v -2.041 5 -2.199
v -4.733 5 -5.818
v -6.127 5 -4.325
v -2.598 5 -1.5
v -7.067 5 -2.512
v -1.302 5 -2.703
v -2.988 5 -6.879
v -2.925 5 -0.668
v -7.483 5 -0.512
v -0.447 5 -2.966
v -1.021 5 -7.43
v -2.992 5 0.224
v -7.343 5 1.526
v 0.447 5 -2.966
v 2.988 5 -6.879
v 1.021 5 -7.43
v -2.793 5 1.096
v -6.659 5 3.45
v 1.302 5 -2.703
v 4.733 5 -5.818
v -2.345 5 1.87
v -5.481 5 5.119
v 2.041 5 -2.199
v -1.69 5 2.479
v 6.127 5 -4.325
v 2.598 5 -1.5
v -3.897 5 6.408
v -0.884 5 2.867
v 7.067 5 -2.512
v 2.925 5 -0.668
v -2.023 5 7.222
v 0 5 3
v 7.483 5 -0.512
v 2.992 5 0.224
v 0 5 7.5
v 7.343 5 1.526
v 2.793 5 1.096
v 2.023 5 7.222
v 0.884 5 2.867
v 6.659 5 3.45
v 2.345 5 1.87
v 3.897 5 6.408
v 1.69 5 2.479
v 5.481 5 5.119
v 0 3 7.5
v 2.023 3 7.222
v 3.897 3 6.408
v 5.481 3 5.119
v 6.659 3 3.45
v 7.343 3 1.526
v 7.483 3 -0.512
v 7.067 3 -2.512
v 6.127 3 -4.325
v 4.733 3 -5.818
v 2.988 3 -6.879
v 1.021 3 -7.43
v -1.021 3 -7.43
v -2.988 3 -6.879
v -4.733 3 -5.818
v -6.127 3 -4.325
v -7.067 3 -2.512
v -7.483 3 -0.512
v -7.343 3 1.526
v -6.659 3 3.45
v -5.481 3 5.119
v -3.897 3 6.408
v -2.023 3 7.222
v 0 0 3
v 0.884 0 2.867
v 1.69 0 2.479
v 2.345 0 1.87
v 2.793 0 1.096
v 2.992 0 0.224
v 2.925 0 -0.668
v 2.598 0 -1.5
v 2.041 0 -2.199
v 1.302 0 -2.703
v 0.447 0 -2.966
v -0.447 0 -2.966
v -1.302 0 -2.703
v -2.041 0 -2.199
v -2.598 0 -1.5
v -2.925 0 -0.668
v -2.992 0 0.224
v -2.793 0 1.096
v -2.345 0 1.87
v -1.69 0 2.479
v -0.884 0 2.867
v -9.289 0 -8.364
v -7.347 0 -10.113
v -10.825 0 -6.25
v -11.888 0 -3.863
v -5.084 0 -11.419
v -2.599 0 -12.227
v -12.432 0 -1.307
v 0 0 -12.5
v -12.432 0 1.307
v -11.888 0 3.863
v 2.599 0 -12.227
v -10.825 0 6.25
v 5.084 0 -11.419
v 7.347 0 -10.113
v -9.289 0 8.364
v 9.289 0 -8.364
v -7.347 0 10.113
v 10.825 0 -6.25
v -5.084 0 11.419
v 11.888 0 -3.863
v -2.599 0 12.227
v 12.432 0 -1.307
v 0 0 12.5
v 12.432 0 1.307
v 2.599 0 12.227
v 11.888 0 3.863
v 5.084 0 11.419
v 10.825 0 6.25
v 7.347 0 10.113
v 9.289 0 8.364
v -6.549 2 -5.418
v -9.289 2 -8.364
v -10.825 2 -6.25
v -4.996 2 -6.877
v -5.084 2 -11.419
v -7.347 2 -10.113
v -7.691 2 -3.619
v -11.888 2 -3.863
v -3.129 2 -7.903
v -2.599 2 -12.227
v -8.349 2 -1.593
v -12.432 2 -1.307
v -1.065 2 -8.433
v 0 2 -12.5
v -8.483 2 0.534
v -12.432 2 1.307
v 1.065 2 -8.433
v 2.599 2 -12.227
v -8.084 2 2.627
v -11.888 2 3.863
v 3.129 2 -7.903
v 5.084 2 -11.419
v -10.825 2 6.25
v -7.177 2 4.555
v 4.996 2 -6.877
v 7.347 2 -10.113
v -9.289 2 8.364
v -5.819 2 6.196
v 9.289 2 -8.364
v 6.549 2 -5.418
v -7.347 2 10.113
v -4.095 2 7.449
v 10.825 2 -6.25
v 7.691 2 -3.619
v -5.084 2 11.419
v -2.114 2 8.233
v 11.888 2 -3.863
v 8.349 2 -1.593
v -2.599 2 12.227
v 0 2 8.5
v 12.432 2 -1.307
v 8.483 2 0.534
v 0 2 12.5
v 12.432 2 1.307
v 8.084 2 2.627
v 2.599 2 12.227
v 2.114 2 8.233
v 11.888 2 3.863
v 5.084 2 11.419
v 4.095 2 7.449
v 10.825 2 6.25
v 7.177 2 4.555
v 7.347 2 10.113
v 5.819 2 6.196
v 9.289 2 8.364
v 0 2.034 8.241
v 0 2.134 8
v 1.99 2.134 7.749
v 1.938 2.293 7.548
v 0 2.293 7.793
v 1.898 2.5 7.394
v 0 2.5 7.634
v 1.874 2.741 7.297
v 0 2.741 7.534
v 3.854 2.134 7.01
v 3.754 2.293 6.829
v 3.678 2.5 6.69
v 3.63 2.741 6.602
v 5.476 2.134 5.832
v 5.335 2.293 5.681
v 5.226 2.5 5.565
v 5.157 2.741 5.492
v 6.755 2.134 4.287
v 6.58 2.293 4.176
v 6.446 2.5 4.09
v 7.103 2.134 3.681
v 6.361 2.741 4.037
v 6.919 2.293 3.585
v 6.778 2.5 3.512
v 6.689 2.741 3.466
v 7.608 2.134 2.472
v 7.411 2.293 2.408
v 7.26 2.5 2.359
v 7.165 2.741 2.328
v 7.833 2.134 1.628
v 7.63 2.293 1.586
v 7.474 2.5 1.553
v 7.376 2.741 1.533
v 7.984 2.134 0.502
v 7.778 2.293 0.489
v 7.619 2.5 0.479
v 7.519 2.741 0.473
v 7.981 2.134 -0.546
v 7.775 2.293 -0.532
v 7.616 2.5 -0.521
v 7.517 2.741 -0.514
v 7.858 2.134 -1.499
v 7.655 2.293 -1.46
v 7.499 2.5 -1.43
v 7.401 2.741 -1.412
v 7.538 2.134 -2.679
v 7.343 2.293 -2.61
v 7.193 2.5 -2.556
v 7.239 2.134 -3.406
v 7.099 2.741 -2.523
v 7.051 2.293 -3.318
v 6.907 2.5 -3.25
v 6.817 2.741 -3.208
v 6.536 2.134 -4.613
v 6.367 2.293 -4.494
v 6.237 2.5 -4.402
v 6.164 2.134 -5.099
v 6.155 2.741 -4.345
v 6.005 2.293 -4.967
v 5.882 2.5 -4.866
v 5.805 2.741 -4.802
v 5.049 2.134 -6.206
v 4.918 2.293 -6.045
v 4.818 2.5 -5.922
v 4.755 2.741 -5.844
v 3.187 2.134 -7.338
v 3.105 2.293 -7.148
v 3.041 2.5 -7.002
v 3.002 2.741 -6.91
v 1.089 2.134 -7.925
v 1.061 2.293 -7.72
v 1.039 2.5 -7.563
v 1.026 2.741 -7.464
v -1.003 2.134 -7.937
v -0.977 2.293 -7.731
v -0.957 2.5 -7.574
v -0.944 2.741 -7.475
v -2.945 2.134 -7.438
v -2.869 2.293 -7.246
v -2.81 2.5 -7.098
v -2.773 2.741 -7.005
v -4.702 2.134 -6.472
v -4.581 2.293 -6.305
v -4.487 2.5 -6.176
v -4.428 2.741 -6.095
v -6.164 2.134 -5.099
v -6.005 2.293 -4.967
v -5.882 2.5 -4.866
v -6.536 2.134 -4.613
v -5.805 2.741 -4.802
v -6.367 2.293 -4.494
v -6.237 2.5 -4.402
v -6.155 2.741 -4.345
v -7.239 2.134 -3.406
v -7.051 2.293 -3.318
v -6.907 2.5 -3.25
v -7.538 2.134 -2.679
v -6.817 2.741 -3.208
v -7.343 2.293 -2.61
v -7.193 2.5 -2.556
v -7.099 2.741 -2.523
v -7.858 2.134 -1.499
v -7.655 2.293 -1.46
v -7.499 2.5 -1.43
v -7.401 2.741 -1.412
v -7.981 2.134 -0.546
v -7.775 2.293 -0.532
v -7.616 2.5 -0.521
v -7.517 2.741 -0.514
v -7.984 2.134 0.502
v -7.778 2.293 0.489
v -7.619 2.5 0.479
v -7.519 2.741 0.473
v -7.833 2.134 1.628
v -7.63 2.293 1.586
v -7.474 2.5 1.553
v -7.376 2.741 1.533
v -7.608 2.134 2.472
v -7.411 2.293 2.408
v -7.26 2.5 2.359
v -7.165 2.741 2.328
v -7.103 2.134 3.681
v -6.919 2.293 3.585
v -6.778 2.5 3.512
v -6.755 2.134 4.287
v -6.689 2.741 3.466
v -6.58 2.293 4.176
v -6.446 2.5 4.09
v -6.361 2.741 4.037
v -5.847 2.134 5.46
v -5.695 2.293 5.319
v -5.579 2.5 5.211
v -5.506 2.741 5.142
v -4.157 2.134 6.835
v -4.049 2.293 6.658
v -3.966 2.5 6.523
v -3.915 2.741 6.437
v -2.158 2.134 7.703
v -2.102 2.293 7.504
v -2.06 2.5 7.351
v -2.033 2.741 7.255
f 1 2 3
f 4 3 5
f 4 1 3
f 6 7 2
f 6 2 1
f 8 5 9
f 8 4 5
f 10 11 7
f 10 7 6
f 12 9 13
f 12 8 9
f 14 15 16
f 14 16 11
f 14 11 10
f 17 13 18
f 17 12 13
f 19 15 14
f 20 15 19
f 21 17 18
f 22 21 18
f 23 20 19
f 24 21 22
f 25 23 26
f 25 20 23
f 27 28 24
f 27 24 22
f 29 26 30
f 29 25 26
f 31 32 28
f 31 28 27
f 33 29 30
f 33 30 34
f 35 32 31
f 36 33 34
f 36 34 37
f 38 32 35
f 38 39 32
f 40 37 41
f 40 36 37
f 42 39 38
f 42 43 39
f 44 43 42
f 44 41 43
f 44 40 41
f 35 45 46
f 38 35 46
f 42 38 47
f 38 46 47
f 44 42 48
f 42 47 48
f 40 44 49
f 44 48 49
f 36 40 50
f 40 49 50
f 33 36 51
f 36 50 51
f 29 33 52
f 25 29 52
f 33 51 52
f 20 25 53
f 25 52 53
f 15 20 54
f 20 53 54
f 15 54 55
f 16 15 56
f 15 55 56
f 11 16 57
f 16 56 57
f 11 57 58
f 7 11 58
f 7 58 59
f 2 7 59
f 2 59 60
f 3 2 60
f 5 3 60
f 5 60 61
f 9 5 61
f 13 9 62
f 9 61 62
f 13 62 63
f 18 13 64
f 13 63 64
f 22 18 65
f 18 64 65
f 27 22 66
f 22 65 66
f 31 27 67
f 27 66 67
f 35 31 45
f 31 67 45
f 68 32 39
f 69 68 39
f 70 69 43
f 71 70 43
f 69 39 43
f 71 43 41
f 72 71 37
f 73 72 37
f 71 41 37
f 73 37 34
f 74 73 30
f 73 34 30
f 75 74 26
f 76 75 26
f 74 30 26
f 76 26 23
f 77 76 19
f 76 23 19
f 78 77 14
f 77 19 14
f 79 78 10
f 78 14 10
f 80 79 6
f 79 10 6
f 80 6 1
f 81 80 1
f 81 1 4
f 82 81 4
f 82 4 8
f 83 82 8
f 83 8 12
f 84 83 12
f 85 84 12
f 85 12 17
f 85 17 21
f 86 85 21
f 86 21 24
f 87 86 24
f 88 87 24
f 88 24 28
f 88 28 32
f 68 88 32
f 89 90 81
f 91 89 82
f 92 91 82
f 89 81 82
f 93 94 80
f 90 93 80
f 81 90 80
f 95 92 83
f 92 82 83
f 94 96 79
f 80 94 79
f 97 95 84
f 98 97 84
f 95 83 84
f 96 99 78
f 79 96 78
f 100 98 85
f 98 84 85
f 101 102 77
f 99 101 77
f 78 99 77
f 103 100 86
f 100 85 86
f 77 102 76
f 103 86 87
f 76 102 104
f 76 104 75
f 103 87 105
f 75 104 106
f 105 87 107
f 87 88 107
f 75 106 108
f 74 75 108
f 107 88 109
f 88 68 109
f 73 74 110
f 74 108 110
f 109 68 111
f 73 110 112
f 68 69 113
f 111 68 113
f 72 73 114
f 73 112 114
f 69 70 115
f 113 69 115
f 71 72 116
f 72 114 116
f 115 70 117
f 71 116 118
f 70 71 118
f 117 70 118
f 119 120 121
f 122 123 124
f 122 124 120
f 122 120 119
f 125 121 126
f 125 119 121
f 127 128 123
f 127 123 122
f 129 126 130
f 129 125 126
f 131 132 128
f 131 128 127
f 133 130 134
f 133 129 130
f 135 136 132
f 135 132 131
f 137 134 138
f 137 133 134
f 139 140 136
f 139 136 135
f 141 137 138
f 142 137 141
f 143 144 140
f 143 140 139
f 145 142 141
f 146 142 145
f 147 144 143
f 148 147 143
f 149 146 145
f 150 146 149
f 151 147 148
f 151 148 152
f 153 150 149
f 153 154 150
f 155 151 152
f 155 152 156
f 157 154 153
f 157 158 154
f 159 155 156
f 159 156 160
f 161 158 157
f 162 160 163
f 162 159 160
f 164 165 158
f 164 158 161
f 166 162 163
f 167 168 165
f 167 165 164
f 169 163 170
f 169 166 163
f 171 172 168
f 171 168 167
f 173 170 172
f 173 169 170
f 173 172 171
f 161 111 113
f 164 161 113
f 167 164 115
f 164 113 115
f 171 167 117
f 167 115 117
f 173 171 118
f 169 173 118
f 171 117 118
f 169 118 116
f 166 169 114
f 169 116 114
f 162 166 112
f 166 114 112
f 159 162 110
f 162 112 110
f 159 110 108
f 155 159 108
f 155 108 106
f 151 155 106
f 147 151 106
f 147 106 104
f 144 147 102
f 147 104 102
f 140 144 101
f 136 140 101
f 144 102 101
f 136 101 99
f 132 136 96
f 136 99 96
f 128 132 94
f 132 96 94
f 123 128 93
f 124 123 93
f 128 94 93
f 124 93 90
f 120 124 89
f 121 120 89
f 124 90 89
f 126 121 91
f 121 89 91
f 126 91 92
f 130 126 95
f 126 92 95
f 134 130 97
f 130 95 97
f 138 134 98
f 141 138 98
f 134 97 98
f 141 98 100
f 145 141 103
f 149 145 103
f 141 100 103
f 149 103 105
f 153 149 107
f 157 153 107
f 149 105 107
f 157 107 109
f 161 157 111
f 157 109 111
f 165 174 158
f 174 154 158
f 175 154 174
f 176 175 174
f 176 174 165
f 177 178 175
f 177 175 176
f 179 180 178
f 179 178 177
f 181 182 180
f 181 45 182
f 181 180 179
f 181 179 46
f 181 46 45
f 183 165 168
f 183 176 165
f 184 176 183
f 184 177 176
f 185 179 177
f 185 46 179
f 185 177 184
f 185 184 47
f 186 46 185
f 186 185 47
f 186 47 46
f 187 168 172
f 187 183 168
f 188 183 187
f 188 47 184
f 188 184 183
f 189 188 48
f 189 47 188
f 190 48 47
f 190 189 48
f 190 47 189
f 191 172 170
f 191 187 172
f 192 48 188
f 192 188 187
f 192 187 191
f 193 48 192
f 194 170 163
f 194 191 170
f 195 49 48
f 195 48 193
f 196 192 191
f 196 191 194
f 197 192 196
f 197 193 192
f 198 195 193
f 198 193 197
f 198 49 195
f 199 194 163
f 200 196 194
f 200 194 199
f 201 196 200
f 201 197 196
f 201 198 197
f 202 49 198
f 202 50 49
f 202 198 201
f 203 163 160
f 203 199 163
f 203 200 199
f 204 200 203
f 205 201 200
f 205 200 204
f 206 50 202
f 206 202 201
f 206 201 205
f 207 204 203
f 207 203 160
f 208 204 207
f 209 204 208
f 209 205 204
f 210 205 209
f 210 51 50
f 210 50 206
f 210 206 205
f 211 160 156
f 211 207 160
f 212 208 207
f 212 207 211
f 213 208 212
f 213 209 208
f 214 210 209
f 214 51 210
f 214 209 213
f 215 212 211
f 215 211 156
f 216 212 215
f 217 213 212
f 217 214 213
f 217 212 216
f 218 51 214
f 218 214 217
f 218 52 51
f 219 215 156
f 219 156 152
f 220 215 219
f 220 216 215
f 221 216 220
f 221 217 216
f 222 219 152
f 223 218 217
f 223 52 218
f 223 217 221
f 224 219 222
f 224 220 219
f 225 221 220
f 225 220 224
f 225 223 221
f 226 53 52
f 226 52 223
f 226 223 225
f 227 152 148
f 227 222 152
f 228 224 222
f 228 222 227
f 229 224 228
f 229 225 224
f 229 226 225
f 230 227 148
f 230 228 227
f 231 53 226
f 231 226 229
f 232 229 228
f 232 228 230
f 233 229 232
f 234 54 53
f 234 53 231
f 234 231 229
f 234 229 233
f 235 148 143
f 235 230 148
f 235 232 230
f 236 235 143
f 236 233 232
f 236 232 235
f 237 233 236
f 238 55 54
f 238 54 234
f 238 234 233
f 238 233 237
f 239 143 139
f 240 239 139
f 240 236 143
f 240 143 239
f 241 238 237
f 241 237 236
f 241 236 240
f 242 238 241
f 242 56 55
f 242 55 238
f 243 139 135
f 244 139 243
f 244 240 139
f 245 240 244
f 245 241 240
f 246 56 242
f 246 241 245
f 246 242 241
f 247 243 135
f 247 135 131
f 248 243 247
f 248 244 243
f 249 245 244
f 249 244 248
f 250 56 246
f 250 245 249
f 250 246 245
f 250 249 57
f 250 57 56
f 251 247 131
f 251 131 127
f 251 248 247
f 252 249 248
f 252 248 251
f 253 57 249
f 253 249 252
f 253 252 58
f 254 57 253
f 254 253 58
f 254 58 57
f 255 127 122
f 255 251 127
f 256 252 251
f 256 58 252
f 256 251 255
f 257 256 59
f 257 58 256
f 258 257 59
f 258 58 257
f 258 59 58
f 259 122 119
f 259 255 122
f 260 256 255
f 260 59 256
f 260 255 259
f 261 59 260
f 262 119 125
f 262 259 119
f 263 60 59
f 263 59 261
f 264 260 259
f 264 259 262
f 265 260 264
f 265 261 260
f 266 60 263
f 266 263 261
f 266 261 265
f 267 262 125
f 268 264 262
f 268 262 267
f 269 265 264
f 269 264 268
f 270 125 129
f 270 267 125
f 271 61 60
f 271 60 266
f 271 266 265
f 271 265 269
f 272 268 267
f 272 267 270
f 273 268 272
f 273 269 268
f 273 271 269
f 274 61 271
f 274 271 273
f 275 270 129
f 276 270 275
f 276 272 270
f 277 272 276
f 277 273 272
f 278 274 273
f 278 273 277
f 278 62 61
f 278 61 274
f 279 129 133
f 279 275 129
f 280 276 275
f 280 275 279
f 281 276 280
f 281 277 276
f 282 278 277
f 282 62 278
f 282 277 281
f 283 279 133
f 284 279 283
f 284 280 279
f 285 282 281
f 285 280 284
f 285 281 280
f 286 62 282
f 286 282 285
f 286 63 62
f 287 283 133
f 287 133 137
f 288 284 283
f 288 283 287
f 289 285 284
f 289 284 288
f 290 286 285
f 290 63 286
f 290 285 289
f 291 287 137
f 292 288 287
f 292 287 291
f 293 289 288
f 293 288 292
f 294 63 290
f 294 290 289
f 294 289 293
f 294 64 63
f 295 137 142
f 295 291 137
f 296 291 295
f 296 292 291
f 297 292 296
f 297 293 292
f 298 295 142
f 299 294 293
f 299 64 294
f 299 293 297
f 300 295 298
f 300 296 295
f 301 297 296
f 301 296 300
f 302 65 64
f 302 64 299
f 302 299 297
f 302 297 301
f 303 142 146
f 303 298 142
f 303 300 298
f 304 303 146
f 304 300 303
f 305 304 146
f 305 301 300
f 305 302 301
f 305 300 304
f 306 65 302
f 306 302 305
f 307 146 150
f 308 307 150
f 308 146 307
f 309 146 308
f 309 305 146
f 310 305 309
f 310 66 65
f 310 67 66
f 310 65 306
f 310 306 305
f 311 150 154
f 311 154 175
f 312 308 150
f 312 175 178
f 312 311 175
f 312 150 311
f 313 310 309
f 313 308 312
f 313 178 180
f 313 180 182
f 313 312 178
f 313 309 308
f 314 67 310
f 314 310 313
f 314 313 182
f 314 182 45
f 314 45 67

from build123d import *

# Parameters (mm, degrees)
SKETCH_1_R          = 12.5
EXTRUDE_1_DEPTH     = 2
SKETCH_2_R          = 7.5
EXTRUDE_2_DEPTH     = 3
FILLET_1_R          = 1
CUT_EXTRUDE_1_REACH = 20.371
SKETCH_3_R          = 3


with BuildPart() as part:
    # 草图1 → 凸台-拉伸1 (new body)
    with BuildSketch(Plane(origin=(0, 0, 0), x_dir=(1, 0, 0), z_dir=(0, 1, 0))):
        with Locations(Location((0, 0, 0), (0, 0, 270))):
            Circle(SKETCH_1_R)
    extrude(amount=EXTRUDE_1_DEPTH)

    # 草图2 → 凸台-拉伸2 (add)
    with BuildSketch(Plane(origin=(0, 2, 0), x_dir=(1, 0, 0), z_dir=(0, 1, 0))):
        with Locations(Location((0, 0, 0), (0, 0, 270))):
            Circle(SKETCH_2_R)
    extrude(amount=EXTRUDE_2_DEPTH)

    # 圆角1
    fillet_1_edges = [part.edges().sort_by_distance(p)[0] for p in [
        (0, 2, -7.5),
    ]]
    fillet(fillet_1_edges, radius=FILLET_1_R)

    # 草图3 → 切除-拉伸1 (cut, up to next)
    with BuildSketch(Plane(origin=(0, 5, 0), x_dir=(1, 0, 0), z_dir=(0, 1, 0)), mode=Mode.PRIVATE) as cut_extrude_1_sk1:
        with Locations(Location((0, 0, 0), (0, 0, 270))):
            Circle(SKETCH_3_R)
    cut_extrude_1_tool1 = extrude(cut_extrude_1_sk1.sketch, amount=-CUT_EXTRUDE_1_REACH, mode=Mode.PRIVATE) & part.part
    add(cut_extrude_1_tool1.solids().sort_by_distance((0, 5, 0))[0], mode=Mode.SUBTRACT)


solid = part.part
